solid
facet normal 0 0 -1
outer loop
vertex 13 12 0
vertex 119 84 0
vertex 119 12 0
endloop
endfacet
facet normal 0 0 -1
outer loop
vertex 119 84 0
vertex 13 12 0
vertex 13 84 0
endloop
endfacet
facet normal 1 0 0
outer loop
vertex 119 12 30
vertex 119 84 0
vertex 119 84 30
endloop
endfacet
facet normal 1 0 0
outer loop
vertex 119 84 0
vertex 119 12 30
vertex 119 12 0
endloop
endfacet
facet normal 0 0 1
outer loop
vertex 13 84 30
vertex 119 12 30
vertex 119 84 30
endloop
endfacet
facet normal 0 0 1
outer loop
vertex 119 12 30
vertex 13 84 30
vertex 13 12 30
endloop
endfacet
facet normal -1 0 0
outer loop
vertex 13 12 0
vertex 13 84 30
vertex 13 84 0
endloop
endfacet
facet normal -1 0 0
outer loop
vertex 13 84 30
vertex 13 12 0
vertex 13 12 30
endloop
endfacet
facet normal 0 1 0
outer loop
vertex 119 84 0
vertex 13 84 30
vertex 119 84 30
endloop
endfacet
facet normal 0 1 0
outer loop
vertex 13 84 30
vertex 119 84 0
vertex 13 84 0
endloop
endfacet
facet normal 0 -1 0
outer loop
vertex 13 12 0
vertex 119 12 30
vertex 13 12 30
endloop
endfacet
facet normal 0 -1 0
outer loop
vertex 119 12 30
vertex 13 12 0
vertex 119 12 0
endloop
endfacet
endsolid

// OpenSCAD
// Bench rack for 1.5 mL microcentrifuge tubes
// Dimensions measured with calipers, units in millimetres

// Overall block dimensions
block_length = 106;  // X dimension
block_width = 72;    // Y dimension
block_height = 30;   // Z dimension

// Hole grid dimensions
rows_count = 4;      // Number of rows along Y
cols_count = 6;      // Number of columns along X
hole_pitch_x = 16; // Centre-to-centre spacing in X
hole_pitch_y = 16; // Centre-to-centre spacing in Y

// Hole dimensions
hole_diameter = 11.2;
hole_depth = 25;
floor_thickness = 5;

// Calculate grid centering offsets
// Total grid width = (cols_count - 1) * pitch_x
// Total grid height = (rows_count - 1) * pitch_y
grid_width = (cols_count - 1) * hole_pitch_x;
grid_height = (rows_count - 1) * hole_pitch_y;

offset_x = (block_length - grid_width) / 2;
offset_y = (block_width - grid_height) / 2;

// Hole radius
hole_radius = hole_diameter / 2;

// Define the base block
module base_block() {
    translate([offset_x, offset_y, 0])
        cube([block_length, block_width, block_height], center = false);
}

// Define a single hole cylinder
// Extends slightly past the bottom to ensure clean cut (Rule 5)
module single_hole(x_pos, y_pos) {
    translate([x_pos, y_pos, 0])
        cylinder(h = hole_depth + 0.01, r = hole_radius, $fn = 64);
}

// Main assembly
// We use a single difference operation: Base Block minus all Holes
union() {
    // The base block
    base_block();
    
    // The holes are subtracted from the base block in the difference operation below
    // We create a union of all holes to subtract them all at once
    difference() {
        base_block();
        
        // Generate hole grid
        for (i = [0 : cols_count - 1]) {
            for (j = [0 : rows_count - 1]) {
                x_pos = offset_x + i * hole_pitch_x;
                y_pos = offset_y + j * hole_pitch_y;
                single_hole(x_pos, y_pos);
            }
        }
    }
}
